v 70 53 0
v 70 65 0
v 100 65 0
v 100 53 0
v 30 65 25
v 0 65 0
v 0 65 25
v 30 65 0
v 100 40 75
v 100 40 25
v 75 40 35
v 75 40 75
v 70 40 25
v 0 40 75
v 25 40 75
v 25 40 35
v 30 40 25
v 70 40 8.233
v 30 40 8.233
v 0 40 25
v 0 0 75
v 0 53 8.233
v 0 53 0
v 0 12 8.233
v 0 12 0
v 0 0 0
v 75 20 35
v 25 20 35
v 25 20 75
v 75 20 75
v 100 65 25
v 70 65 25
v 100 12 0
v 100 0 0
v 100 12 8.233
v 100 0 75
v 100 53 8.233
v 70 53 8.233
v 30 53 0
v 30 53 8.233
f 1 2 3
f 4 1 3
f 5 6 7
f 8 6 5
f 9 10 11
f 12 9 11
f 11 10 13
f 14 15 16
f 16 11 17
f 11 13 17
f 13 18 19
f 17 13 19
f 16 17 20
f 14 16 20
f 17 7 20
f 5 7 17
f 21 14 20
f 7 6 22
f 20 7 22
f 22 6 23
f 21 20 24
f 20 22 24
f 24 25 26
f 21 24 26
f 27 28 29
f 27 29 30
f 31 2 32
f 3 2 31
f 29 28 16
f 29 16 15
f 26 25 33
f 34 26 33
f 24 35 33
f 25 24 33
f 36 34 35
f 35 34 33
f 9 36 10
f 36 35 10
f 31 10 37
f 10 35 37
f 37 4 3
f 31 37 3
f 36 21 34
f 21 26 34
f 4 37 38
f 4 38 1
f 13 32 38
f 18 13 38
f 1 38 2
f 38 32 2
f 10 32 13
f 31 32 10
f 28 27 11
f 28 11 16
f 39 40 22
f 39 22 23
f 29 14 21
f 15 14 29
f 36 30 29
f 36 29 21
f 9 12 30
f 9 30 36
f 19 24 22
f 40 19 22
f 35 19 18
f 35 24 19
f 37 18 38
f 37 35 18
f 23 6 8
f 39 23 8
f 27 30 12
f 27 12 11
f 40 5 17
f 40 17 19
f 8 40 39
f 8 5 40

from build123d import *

# Parameters (mm, degrees)
SKETCH1_W               = 100
SKETCH1_H               = 65
BOSS_EXTRUDE1_DEPTH     = 25
CUT_EXTRUDE1_REACH      = 123.861
SKETCH2_W               = 8.232646472
SKETCH2_H               = 41
SKETCH3_W               = 40
SKETCH3_H               = 25
CUT_EXTRUDE2_DEPTH      = 25
BOSS_EXTRUDE2_DEPTH     = 50
CUT_EXTRUDE3_DEPTH      = 132.244047484
CUT_EXTRUDE3_DEPTH_BACK = 20


with BuildPart() as part:
    # Sketch1 → Boss-Extrude1 (new body)
    with BuildSketch(Plane.XY):
        with Locations((50, 32.5)):
            Rectangle(SKETCH1_W, SKETCH1_H)
    extrude(amount=BOSS_EXTRUDE1_DEPTH)

    # Sketch2 → Cut-Extrude1 (cut, up to next)
    with BuildSketch(Plane(origin=(100, 0, 0), x_dir=(0, 0, -1), z_dir=(1, 0, 0)), mode=Mode.PRIVATE) as cut_extrude1_sk1:
        with Locations((-4.116323236, 32.5)):
            Rectangle(SKETCH2_W, SKETCH2_H)
    cut_extrude1_tool1 = extrude(cut_extrude1_sk1.sketch, amount=-CUT_EXTRUDE1_REACH, mode=Mode.PRIVATE) & part.part
    add(cut_extrude1_tool1.solids().sort_by_distance((100, 32.5, 4.116323))[0], mode=Mode.SUBTRACT)

    # Sketch3 → Cut-Extrude2 (cut)
    with BuildSketch(Plane(origin=(0, 65, 0), x_dir=(1, 0, 0), z_dir=(0, 1, 0))):
        with Locations((50, -12.5)):
            Rectangle(SKETCH3_W, SKETCH3_H)
    extrude(amount=-CUT_EXTRUDE2_DEPTH, mode=Mode.SUBTRACT)

    # Sketch4 → Boss-Extrude2 (add)
    with BuildSketch(Plane.XY.offset(25)):
        Polygon((30, 40), (0, 40), (0, 0), (100, 0), (100, 40), (70, 40), align=None)
    extrude(amount=BOSS_EXTRUDE2_DEPTH)

    # Sketch6 → Cut-Extrude3 (cut, two sides: drawn at the far end of the back side and taken through both)
    with BuildSketch(Plane(origin=(0, 40, 0), x_dir=(1, 0, 0), z_dir=(0, 1, 0)).offset(-CUT_EXTRUDE3_DEPTH_BACK)):
        Polygon((75, -297.132034356), (75, -75), (75, -35), (25, -35), (25, -75), (25, -297.132034356), (25, -741.396103068), (75, -741.396103068), align=None)
    extrude(amount=CUT_EXTRUDE3_DEPTH + CUT_EXTRUDE3_DEPTH_BACK, mode=Mode.SUBTRACT)


solid = part.part
